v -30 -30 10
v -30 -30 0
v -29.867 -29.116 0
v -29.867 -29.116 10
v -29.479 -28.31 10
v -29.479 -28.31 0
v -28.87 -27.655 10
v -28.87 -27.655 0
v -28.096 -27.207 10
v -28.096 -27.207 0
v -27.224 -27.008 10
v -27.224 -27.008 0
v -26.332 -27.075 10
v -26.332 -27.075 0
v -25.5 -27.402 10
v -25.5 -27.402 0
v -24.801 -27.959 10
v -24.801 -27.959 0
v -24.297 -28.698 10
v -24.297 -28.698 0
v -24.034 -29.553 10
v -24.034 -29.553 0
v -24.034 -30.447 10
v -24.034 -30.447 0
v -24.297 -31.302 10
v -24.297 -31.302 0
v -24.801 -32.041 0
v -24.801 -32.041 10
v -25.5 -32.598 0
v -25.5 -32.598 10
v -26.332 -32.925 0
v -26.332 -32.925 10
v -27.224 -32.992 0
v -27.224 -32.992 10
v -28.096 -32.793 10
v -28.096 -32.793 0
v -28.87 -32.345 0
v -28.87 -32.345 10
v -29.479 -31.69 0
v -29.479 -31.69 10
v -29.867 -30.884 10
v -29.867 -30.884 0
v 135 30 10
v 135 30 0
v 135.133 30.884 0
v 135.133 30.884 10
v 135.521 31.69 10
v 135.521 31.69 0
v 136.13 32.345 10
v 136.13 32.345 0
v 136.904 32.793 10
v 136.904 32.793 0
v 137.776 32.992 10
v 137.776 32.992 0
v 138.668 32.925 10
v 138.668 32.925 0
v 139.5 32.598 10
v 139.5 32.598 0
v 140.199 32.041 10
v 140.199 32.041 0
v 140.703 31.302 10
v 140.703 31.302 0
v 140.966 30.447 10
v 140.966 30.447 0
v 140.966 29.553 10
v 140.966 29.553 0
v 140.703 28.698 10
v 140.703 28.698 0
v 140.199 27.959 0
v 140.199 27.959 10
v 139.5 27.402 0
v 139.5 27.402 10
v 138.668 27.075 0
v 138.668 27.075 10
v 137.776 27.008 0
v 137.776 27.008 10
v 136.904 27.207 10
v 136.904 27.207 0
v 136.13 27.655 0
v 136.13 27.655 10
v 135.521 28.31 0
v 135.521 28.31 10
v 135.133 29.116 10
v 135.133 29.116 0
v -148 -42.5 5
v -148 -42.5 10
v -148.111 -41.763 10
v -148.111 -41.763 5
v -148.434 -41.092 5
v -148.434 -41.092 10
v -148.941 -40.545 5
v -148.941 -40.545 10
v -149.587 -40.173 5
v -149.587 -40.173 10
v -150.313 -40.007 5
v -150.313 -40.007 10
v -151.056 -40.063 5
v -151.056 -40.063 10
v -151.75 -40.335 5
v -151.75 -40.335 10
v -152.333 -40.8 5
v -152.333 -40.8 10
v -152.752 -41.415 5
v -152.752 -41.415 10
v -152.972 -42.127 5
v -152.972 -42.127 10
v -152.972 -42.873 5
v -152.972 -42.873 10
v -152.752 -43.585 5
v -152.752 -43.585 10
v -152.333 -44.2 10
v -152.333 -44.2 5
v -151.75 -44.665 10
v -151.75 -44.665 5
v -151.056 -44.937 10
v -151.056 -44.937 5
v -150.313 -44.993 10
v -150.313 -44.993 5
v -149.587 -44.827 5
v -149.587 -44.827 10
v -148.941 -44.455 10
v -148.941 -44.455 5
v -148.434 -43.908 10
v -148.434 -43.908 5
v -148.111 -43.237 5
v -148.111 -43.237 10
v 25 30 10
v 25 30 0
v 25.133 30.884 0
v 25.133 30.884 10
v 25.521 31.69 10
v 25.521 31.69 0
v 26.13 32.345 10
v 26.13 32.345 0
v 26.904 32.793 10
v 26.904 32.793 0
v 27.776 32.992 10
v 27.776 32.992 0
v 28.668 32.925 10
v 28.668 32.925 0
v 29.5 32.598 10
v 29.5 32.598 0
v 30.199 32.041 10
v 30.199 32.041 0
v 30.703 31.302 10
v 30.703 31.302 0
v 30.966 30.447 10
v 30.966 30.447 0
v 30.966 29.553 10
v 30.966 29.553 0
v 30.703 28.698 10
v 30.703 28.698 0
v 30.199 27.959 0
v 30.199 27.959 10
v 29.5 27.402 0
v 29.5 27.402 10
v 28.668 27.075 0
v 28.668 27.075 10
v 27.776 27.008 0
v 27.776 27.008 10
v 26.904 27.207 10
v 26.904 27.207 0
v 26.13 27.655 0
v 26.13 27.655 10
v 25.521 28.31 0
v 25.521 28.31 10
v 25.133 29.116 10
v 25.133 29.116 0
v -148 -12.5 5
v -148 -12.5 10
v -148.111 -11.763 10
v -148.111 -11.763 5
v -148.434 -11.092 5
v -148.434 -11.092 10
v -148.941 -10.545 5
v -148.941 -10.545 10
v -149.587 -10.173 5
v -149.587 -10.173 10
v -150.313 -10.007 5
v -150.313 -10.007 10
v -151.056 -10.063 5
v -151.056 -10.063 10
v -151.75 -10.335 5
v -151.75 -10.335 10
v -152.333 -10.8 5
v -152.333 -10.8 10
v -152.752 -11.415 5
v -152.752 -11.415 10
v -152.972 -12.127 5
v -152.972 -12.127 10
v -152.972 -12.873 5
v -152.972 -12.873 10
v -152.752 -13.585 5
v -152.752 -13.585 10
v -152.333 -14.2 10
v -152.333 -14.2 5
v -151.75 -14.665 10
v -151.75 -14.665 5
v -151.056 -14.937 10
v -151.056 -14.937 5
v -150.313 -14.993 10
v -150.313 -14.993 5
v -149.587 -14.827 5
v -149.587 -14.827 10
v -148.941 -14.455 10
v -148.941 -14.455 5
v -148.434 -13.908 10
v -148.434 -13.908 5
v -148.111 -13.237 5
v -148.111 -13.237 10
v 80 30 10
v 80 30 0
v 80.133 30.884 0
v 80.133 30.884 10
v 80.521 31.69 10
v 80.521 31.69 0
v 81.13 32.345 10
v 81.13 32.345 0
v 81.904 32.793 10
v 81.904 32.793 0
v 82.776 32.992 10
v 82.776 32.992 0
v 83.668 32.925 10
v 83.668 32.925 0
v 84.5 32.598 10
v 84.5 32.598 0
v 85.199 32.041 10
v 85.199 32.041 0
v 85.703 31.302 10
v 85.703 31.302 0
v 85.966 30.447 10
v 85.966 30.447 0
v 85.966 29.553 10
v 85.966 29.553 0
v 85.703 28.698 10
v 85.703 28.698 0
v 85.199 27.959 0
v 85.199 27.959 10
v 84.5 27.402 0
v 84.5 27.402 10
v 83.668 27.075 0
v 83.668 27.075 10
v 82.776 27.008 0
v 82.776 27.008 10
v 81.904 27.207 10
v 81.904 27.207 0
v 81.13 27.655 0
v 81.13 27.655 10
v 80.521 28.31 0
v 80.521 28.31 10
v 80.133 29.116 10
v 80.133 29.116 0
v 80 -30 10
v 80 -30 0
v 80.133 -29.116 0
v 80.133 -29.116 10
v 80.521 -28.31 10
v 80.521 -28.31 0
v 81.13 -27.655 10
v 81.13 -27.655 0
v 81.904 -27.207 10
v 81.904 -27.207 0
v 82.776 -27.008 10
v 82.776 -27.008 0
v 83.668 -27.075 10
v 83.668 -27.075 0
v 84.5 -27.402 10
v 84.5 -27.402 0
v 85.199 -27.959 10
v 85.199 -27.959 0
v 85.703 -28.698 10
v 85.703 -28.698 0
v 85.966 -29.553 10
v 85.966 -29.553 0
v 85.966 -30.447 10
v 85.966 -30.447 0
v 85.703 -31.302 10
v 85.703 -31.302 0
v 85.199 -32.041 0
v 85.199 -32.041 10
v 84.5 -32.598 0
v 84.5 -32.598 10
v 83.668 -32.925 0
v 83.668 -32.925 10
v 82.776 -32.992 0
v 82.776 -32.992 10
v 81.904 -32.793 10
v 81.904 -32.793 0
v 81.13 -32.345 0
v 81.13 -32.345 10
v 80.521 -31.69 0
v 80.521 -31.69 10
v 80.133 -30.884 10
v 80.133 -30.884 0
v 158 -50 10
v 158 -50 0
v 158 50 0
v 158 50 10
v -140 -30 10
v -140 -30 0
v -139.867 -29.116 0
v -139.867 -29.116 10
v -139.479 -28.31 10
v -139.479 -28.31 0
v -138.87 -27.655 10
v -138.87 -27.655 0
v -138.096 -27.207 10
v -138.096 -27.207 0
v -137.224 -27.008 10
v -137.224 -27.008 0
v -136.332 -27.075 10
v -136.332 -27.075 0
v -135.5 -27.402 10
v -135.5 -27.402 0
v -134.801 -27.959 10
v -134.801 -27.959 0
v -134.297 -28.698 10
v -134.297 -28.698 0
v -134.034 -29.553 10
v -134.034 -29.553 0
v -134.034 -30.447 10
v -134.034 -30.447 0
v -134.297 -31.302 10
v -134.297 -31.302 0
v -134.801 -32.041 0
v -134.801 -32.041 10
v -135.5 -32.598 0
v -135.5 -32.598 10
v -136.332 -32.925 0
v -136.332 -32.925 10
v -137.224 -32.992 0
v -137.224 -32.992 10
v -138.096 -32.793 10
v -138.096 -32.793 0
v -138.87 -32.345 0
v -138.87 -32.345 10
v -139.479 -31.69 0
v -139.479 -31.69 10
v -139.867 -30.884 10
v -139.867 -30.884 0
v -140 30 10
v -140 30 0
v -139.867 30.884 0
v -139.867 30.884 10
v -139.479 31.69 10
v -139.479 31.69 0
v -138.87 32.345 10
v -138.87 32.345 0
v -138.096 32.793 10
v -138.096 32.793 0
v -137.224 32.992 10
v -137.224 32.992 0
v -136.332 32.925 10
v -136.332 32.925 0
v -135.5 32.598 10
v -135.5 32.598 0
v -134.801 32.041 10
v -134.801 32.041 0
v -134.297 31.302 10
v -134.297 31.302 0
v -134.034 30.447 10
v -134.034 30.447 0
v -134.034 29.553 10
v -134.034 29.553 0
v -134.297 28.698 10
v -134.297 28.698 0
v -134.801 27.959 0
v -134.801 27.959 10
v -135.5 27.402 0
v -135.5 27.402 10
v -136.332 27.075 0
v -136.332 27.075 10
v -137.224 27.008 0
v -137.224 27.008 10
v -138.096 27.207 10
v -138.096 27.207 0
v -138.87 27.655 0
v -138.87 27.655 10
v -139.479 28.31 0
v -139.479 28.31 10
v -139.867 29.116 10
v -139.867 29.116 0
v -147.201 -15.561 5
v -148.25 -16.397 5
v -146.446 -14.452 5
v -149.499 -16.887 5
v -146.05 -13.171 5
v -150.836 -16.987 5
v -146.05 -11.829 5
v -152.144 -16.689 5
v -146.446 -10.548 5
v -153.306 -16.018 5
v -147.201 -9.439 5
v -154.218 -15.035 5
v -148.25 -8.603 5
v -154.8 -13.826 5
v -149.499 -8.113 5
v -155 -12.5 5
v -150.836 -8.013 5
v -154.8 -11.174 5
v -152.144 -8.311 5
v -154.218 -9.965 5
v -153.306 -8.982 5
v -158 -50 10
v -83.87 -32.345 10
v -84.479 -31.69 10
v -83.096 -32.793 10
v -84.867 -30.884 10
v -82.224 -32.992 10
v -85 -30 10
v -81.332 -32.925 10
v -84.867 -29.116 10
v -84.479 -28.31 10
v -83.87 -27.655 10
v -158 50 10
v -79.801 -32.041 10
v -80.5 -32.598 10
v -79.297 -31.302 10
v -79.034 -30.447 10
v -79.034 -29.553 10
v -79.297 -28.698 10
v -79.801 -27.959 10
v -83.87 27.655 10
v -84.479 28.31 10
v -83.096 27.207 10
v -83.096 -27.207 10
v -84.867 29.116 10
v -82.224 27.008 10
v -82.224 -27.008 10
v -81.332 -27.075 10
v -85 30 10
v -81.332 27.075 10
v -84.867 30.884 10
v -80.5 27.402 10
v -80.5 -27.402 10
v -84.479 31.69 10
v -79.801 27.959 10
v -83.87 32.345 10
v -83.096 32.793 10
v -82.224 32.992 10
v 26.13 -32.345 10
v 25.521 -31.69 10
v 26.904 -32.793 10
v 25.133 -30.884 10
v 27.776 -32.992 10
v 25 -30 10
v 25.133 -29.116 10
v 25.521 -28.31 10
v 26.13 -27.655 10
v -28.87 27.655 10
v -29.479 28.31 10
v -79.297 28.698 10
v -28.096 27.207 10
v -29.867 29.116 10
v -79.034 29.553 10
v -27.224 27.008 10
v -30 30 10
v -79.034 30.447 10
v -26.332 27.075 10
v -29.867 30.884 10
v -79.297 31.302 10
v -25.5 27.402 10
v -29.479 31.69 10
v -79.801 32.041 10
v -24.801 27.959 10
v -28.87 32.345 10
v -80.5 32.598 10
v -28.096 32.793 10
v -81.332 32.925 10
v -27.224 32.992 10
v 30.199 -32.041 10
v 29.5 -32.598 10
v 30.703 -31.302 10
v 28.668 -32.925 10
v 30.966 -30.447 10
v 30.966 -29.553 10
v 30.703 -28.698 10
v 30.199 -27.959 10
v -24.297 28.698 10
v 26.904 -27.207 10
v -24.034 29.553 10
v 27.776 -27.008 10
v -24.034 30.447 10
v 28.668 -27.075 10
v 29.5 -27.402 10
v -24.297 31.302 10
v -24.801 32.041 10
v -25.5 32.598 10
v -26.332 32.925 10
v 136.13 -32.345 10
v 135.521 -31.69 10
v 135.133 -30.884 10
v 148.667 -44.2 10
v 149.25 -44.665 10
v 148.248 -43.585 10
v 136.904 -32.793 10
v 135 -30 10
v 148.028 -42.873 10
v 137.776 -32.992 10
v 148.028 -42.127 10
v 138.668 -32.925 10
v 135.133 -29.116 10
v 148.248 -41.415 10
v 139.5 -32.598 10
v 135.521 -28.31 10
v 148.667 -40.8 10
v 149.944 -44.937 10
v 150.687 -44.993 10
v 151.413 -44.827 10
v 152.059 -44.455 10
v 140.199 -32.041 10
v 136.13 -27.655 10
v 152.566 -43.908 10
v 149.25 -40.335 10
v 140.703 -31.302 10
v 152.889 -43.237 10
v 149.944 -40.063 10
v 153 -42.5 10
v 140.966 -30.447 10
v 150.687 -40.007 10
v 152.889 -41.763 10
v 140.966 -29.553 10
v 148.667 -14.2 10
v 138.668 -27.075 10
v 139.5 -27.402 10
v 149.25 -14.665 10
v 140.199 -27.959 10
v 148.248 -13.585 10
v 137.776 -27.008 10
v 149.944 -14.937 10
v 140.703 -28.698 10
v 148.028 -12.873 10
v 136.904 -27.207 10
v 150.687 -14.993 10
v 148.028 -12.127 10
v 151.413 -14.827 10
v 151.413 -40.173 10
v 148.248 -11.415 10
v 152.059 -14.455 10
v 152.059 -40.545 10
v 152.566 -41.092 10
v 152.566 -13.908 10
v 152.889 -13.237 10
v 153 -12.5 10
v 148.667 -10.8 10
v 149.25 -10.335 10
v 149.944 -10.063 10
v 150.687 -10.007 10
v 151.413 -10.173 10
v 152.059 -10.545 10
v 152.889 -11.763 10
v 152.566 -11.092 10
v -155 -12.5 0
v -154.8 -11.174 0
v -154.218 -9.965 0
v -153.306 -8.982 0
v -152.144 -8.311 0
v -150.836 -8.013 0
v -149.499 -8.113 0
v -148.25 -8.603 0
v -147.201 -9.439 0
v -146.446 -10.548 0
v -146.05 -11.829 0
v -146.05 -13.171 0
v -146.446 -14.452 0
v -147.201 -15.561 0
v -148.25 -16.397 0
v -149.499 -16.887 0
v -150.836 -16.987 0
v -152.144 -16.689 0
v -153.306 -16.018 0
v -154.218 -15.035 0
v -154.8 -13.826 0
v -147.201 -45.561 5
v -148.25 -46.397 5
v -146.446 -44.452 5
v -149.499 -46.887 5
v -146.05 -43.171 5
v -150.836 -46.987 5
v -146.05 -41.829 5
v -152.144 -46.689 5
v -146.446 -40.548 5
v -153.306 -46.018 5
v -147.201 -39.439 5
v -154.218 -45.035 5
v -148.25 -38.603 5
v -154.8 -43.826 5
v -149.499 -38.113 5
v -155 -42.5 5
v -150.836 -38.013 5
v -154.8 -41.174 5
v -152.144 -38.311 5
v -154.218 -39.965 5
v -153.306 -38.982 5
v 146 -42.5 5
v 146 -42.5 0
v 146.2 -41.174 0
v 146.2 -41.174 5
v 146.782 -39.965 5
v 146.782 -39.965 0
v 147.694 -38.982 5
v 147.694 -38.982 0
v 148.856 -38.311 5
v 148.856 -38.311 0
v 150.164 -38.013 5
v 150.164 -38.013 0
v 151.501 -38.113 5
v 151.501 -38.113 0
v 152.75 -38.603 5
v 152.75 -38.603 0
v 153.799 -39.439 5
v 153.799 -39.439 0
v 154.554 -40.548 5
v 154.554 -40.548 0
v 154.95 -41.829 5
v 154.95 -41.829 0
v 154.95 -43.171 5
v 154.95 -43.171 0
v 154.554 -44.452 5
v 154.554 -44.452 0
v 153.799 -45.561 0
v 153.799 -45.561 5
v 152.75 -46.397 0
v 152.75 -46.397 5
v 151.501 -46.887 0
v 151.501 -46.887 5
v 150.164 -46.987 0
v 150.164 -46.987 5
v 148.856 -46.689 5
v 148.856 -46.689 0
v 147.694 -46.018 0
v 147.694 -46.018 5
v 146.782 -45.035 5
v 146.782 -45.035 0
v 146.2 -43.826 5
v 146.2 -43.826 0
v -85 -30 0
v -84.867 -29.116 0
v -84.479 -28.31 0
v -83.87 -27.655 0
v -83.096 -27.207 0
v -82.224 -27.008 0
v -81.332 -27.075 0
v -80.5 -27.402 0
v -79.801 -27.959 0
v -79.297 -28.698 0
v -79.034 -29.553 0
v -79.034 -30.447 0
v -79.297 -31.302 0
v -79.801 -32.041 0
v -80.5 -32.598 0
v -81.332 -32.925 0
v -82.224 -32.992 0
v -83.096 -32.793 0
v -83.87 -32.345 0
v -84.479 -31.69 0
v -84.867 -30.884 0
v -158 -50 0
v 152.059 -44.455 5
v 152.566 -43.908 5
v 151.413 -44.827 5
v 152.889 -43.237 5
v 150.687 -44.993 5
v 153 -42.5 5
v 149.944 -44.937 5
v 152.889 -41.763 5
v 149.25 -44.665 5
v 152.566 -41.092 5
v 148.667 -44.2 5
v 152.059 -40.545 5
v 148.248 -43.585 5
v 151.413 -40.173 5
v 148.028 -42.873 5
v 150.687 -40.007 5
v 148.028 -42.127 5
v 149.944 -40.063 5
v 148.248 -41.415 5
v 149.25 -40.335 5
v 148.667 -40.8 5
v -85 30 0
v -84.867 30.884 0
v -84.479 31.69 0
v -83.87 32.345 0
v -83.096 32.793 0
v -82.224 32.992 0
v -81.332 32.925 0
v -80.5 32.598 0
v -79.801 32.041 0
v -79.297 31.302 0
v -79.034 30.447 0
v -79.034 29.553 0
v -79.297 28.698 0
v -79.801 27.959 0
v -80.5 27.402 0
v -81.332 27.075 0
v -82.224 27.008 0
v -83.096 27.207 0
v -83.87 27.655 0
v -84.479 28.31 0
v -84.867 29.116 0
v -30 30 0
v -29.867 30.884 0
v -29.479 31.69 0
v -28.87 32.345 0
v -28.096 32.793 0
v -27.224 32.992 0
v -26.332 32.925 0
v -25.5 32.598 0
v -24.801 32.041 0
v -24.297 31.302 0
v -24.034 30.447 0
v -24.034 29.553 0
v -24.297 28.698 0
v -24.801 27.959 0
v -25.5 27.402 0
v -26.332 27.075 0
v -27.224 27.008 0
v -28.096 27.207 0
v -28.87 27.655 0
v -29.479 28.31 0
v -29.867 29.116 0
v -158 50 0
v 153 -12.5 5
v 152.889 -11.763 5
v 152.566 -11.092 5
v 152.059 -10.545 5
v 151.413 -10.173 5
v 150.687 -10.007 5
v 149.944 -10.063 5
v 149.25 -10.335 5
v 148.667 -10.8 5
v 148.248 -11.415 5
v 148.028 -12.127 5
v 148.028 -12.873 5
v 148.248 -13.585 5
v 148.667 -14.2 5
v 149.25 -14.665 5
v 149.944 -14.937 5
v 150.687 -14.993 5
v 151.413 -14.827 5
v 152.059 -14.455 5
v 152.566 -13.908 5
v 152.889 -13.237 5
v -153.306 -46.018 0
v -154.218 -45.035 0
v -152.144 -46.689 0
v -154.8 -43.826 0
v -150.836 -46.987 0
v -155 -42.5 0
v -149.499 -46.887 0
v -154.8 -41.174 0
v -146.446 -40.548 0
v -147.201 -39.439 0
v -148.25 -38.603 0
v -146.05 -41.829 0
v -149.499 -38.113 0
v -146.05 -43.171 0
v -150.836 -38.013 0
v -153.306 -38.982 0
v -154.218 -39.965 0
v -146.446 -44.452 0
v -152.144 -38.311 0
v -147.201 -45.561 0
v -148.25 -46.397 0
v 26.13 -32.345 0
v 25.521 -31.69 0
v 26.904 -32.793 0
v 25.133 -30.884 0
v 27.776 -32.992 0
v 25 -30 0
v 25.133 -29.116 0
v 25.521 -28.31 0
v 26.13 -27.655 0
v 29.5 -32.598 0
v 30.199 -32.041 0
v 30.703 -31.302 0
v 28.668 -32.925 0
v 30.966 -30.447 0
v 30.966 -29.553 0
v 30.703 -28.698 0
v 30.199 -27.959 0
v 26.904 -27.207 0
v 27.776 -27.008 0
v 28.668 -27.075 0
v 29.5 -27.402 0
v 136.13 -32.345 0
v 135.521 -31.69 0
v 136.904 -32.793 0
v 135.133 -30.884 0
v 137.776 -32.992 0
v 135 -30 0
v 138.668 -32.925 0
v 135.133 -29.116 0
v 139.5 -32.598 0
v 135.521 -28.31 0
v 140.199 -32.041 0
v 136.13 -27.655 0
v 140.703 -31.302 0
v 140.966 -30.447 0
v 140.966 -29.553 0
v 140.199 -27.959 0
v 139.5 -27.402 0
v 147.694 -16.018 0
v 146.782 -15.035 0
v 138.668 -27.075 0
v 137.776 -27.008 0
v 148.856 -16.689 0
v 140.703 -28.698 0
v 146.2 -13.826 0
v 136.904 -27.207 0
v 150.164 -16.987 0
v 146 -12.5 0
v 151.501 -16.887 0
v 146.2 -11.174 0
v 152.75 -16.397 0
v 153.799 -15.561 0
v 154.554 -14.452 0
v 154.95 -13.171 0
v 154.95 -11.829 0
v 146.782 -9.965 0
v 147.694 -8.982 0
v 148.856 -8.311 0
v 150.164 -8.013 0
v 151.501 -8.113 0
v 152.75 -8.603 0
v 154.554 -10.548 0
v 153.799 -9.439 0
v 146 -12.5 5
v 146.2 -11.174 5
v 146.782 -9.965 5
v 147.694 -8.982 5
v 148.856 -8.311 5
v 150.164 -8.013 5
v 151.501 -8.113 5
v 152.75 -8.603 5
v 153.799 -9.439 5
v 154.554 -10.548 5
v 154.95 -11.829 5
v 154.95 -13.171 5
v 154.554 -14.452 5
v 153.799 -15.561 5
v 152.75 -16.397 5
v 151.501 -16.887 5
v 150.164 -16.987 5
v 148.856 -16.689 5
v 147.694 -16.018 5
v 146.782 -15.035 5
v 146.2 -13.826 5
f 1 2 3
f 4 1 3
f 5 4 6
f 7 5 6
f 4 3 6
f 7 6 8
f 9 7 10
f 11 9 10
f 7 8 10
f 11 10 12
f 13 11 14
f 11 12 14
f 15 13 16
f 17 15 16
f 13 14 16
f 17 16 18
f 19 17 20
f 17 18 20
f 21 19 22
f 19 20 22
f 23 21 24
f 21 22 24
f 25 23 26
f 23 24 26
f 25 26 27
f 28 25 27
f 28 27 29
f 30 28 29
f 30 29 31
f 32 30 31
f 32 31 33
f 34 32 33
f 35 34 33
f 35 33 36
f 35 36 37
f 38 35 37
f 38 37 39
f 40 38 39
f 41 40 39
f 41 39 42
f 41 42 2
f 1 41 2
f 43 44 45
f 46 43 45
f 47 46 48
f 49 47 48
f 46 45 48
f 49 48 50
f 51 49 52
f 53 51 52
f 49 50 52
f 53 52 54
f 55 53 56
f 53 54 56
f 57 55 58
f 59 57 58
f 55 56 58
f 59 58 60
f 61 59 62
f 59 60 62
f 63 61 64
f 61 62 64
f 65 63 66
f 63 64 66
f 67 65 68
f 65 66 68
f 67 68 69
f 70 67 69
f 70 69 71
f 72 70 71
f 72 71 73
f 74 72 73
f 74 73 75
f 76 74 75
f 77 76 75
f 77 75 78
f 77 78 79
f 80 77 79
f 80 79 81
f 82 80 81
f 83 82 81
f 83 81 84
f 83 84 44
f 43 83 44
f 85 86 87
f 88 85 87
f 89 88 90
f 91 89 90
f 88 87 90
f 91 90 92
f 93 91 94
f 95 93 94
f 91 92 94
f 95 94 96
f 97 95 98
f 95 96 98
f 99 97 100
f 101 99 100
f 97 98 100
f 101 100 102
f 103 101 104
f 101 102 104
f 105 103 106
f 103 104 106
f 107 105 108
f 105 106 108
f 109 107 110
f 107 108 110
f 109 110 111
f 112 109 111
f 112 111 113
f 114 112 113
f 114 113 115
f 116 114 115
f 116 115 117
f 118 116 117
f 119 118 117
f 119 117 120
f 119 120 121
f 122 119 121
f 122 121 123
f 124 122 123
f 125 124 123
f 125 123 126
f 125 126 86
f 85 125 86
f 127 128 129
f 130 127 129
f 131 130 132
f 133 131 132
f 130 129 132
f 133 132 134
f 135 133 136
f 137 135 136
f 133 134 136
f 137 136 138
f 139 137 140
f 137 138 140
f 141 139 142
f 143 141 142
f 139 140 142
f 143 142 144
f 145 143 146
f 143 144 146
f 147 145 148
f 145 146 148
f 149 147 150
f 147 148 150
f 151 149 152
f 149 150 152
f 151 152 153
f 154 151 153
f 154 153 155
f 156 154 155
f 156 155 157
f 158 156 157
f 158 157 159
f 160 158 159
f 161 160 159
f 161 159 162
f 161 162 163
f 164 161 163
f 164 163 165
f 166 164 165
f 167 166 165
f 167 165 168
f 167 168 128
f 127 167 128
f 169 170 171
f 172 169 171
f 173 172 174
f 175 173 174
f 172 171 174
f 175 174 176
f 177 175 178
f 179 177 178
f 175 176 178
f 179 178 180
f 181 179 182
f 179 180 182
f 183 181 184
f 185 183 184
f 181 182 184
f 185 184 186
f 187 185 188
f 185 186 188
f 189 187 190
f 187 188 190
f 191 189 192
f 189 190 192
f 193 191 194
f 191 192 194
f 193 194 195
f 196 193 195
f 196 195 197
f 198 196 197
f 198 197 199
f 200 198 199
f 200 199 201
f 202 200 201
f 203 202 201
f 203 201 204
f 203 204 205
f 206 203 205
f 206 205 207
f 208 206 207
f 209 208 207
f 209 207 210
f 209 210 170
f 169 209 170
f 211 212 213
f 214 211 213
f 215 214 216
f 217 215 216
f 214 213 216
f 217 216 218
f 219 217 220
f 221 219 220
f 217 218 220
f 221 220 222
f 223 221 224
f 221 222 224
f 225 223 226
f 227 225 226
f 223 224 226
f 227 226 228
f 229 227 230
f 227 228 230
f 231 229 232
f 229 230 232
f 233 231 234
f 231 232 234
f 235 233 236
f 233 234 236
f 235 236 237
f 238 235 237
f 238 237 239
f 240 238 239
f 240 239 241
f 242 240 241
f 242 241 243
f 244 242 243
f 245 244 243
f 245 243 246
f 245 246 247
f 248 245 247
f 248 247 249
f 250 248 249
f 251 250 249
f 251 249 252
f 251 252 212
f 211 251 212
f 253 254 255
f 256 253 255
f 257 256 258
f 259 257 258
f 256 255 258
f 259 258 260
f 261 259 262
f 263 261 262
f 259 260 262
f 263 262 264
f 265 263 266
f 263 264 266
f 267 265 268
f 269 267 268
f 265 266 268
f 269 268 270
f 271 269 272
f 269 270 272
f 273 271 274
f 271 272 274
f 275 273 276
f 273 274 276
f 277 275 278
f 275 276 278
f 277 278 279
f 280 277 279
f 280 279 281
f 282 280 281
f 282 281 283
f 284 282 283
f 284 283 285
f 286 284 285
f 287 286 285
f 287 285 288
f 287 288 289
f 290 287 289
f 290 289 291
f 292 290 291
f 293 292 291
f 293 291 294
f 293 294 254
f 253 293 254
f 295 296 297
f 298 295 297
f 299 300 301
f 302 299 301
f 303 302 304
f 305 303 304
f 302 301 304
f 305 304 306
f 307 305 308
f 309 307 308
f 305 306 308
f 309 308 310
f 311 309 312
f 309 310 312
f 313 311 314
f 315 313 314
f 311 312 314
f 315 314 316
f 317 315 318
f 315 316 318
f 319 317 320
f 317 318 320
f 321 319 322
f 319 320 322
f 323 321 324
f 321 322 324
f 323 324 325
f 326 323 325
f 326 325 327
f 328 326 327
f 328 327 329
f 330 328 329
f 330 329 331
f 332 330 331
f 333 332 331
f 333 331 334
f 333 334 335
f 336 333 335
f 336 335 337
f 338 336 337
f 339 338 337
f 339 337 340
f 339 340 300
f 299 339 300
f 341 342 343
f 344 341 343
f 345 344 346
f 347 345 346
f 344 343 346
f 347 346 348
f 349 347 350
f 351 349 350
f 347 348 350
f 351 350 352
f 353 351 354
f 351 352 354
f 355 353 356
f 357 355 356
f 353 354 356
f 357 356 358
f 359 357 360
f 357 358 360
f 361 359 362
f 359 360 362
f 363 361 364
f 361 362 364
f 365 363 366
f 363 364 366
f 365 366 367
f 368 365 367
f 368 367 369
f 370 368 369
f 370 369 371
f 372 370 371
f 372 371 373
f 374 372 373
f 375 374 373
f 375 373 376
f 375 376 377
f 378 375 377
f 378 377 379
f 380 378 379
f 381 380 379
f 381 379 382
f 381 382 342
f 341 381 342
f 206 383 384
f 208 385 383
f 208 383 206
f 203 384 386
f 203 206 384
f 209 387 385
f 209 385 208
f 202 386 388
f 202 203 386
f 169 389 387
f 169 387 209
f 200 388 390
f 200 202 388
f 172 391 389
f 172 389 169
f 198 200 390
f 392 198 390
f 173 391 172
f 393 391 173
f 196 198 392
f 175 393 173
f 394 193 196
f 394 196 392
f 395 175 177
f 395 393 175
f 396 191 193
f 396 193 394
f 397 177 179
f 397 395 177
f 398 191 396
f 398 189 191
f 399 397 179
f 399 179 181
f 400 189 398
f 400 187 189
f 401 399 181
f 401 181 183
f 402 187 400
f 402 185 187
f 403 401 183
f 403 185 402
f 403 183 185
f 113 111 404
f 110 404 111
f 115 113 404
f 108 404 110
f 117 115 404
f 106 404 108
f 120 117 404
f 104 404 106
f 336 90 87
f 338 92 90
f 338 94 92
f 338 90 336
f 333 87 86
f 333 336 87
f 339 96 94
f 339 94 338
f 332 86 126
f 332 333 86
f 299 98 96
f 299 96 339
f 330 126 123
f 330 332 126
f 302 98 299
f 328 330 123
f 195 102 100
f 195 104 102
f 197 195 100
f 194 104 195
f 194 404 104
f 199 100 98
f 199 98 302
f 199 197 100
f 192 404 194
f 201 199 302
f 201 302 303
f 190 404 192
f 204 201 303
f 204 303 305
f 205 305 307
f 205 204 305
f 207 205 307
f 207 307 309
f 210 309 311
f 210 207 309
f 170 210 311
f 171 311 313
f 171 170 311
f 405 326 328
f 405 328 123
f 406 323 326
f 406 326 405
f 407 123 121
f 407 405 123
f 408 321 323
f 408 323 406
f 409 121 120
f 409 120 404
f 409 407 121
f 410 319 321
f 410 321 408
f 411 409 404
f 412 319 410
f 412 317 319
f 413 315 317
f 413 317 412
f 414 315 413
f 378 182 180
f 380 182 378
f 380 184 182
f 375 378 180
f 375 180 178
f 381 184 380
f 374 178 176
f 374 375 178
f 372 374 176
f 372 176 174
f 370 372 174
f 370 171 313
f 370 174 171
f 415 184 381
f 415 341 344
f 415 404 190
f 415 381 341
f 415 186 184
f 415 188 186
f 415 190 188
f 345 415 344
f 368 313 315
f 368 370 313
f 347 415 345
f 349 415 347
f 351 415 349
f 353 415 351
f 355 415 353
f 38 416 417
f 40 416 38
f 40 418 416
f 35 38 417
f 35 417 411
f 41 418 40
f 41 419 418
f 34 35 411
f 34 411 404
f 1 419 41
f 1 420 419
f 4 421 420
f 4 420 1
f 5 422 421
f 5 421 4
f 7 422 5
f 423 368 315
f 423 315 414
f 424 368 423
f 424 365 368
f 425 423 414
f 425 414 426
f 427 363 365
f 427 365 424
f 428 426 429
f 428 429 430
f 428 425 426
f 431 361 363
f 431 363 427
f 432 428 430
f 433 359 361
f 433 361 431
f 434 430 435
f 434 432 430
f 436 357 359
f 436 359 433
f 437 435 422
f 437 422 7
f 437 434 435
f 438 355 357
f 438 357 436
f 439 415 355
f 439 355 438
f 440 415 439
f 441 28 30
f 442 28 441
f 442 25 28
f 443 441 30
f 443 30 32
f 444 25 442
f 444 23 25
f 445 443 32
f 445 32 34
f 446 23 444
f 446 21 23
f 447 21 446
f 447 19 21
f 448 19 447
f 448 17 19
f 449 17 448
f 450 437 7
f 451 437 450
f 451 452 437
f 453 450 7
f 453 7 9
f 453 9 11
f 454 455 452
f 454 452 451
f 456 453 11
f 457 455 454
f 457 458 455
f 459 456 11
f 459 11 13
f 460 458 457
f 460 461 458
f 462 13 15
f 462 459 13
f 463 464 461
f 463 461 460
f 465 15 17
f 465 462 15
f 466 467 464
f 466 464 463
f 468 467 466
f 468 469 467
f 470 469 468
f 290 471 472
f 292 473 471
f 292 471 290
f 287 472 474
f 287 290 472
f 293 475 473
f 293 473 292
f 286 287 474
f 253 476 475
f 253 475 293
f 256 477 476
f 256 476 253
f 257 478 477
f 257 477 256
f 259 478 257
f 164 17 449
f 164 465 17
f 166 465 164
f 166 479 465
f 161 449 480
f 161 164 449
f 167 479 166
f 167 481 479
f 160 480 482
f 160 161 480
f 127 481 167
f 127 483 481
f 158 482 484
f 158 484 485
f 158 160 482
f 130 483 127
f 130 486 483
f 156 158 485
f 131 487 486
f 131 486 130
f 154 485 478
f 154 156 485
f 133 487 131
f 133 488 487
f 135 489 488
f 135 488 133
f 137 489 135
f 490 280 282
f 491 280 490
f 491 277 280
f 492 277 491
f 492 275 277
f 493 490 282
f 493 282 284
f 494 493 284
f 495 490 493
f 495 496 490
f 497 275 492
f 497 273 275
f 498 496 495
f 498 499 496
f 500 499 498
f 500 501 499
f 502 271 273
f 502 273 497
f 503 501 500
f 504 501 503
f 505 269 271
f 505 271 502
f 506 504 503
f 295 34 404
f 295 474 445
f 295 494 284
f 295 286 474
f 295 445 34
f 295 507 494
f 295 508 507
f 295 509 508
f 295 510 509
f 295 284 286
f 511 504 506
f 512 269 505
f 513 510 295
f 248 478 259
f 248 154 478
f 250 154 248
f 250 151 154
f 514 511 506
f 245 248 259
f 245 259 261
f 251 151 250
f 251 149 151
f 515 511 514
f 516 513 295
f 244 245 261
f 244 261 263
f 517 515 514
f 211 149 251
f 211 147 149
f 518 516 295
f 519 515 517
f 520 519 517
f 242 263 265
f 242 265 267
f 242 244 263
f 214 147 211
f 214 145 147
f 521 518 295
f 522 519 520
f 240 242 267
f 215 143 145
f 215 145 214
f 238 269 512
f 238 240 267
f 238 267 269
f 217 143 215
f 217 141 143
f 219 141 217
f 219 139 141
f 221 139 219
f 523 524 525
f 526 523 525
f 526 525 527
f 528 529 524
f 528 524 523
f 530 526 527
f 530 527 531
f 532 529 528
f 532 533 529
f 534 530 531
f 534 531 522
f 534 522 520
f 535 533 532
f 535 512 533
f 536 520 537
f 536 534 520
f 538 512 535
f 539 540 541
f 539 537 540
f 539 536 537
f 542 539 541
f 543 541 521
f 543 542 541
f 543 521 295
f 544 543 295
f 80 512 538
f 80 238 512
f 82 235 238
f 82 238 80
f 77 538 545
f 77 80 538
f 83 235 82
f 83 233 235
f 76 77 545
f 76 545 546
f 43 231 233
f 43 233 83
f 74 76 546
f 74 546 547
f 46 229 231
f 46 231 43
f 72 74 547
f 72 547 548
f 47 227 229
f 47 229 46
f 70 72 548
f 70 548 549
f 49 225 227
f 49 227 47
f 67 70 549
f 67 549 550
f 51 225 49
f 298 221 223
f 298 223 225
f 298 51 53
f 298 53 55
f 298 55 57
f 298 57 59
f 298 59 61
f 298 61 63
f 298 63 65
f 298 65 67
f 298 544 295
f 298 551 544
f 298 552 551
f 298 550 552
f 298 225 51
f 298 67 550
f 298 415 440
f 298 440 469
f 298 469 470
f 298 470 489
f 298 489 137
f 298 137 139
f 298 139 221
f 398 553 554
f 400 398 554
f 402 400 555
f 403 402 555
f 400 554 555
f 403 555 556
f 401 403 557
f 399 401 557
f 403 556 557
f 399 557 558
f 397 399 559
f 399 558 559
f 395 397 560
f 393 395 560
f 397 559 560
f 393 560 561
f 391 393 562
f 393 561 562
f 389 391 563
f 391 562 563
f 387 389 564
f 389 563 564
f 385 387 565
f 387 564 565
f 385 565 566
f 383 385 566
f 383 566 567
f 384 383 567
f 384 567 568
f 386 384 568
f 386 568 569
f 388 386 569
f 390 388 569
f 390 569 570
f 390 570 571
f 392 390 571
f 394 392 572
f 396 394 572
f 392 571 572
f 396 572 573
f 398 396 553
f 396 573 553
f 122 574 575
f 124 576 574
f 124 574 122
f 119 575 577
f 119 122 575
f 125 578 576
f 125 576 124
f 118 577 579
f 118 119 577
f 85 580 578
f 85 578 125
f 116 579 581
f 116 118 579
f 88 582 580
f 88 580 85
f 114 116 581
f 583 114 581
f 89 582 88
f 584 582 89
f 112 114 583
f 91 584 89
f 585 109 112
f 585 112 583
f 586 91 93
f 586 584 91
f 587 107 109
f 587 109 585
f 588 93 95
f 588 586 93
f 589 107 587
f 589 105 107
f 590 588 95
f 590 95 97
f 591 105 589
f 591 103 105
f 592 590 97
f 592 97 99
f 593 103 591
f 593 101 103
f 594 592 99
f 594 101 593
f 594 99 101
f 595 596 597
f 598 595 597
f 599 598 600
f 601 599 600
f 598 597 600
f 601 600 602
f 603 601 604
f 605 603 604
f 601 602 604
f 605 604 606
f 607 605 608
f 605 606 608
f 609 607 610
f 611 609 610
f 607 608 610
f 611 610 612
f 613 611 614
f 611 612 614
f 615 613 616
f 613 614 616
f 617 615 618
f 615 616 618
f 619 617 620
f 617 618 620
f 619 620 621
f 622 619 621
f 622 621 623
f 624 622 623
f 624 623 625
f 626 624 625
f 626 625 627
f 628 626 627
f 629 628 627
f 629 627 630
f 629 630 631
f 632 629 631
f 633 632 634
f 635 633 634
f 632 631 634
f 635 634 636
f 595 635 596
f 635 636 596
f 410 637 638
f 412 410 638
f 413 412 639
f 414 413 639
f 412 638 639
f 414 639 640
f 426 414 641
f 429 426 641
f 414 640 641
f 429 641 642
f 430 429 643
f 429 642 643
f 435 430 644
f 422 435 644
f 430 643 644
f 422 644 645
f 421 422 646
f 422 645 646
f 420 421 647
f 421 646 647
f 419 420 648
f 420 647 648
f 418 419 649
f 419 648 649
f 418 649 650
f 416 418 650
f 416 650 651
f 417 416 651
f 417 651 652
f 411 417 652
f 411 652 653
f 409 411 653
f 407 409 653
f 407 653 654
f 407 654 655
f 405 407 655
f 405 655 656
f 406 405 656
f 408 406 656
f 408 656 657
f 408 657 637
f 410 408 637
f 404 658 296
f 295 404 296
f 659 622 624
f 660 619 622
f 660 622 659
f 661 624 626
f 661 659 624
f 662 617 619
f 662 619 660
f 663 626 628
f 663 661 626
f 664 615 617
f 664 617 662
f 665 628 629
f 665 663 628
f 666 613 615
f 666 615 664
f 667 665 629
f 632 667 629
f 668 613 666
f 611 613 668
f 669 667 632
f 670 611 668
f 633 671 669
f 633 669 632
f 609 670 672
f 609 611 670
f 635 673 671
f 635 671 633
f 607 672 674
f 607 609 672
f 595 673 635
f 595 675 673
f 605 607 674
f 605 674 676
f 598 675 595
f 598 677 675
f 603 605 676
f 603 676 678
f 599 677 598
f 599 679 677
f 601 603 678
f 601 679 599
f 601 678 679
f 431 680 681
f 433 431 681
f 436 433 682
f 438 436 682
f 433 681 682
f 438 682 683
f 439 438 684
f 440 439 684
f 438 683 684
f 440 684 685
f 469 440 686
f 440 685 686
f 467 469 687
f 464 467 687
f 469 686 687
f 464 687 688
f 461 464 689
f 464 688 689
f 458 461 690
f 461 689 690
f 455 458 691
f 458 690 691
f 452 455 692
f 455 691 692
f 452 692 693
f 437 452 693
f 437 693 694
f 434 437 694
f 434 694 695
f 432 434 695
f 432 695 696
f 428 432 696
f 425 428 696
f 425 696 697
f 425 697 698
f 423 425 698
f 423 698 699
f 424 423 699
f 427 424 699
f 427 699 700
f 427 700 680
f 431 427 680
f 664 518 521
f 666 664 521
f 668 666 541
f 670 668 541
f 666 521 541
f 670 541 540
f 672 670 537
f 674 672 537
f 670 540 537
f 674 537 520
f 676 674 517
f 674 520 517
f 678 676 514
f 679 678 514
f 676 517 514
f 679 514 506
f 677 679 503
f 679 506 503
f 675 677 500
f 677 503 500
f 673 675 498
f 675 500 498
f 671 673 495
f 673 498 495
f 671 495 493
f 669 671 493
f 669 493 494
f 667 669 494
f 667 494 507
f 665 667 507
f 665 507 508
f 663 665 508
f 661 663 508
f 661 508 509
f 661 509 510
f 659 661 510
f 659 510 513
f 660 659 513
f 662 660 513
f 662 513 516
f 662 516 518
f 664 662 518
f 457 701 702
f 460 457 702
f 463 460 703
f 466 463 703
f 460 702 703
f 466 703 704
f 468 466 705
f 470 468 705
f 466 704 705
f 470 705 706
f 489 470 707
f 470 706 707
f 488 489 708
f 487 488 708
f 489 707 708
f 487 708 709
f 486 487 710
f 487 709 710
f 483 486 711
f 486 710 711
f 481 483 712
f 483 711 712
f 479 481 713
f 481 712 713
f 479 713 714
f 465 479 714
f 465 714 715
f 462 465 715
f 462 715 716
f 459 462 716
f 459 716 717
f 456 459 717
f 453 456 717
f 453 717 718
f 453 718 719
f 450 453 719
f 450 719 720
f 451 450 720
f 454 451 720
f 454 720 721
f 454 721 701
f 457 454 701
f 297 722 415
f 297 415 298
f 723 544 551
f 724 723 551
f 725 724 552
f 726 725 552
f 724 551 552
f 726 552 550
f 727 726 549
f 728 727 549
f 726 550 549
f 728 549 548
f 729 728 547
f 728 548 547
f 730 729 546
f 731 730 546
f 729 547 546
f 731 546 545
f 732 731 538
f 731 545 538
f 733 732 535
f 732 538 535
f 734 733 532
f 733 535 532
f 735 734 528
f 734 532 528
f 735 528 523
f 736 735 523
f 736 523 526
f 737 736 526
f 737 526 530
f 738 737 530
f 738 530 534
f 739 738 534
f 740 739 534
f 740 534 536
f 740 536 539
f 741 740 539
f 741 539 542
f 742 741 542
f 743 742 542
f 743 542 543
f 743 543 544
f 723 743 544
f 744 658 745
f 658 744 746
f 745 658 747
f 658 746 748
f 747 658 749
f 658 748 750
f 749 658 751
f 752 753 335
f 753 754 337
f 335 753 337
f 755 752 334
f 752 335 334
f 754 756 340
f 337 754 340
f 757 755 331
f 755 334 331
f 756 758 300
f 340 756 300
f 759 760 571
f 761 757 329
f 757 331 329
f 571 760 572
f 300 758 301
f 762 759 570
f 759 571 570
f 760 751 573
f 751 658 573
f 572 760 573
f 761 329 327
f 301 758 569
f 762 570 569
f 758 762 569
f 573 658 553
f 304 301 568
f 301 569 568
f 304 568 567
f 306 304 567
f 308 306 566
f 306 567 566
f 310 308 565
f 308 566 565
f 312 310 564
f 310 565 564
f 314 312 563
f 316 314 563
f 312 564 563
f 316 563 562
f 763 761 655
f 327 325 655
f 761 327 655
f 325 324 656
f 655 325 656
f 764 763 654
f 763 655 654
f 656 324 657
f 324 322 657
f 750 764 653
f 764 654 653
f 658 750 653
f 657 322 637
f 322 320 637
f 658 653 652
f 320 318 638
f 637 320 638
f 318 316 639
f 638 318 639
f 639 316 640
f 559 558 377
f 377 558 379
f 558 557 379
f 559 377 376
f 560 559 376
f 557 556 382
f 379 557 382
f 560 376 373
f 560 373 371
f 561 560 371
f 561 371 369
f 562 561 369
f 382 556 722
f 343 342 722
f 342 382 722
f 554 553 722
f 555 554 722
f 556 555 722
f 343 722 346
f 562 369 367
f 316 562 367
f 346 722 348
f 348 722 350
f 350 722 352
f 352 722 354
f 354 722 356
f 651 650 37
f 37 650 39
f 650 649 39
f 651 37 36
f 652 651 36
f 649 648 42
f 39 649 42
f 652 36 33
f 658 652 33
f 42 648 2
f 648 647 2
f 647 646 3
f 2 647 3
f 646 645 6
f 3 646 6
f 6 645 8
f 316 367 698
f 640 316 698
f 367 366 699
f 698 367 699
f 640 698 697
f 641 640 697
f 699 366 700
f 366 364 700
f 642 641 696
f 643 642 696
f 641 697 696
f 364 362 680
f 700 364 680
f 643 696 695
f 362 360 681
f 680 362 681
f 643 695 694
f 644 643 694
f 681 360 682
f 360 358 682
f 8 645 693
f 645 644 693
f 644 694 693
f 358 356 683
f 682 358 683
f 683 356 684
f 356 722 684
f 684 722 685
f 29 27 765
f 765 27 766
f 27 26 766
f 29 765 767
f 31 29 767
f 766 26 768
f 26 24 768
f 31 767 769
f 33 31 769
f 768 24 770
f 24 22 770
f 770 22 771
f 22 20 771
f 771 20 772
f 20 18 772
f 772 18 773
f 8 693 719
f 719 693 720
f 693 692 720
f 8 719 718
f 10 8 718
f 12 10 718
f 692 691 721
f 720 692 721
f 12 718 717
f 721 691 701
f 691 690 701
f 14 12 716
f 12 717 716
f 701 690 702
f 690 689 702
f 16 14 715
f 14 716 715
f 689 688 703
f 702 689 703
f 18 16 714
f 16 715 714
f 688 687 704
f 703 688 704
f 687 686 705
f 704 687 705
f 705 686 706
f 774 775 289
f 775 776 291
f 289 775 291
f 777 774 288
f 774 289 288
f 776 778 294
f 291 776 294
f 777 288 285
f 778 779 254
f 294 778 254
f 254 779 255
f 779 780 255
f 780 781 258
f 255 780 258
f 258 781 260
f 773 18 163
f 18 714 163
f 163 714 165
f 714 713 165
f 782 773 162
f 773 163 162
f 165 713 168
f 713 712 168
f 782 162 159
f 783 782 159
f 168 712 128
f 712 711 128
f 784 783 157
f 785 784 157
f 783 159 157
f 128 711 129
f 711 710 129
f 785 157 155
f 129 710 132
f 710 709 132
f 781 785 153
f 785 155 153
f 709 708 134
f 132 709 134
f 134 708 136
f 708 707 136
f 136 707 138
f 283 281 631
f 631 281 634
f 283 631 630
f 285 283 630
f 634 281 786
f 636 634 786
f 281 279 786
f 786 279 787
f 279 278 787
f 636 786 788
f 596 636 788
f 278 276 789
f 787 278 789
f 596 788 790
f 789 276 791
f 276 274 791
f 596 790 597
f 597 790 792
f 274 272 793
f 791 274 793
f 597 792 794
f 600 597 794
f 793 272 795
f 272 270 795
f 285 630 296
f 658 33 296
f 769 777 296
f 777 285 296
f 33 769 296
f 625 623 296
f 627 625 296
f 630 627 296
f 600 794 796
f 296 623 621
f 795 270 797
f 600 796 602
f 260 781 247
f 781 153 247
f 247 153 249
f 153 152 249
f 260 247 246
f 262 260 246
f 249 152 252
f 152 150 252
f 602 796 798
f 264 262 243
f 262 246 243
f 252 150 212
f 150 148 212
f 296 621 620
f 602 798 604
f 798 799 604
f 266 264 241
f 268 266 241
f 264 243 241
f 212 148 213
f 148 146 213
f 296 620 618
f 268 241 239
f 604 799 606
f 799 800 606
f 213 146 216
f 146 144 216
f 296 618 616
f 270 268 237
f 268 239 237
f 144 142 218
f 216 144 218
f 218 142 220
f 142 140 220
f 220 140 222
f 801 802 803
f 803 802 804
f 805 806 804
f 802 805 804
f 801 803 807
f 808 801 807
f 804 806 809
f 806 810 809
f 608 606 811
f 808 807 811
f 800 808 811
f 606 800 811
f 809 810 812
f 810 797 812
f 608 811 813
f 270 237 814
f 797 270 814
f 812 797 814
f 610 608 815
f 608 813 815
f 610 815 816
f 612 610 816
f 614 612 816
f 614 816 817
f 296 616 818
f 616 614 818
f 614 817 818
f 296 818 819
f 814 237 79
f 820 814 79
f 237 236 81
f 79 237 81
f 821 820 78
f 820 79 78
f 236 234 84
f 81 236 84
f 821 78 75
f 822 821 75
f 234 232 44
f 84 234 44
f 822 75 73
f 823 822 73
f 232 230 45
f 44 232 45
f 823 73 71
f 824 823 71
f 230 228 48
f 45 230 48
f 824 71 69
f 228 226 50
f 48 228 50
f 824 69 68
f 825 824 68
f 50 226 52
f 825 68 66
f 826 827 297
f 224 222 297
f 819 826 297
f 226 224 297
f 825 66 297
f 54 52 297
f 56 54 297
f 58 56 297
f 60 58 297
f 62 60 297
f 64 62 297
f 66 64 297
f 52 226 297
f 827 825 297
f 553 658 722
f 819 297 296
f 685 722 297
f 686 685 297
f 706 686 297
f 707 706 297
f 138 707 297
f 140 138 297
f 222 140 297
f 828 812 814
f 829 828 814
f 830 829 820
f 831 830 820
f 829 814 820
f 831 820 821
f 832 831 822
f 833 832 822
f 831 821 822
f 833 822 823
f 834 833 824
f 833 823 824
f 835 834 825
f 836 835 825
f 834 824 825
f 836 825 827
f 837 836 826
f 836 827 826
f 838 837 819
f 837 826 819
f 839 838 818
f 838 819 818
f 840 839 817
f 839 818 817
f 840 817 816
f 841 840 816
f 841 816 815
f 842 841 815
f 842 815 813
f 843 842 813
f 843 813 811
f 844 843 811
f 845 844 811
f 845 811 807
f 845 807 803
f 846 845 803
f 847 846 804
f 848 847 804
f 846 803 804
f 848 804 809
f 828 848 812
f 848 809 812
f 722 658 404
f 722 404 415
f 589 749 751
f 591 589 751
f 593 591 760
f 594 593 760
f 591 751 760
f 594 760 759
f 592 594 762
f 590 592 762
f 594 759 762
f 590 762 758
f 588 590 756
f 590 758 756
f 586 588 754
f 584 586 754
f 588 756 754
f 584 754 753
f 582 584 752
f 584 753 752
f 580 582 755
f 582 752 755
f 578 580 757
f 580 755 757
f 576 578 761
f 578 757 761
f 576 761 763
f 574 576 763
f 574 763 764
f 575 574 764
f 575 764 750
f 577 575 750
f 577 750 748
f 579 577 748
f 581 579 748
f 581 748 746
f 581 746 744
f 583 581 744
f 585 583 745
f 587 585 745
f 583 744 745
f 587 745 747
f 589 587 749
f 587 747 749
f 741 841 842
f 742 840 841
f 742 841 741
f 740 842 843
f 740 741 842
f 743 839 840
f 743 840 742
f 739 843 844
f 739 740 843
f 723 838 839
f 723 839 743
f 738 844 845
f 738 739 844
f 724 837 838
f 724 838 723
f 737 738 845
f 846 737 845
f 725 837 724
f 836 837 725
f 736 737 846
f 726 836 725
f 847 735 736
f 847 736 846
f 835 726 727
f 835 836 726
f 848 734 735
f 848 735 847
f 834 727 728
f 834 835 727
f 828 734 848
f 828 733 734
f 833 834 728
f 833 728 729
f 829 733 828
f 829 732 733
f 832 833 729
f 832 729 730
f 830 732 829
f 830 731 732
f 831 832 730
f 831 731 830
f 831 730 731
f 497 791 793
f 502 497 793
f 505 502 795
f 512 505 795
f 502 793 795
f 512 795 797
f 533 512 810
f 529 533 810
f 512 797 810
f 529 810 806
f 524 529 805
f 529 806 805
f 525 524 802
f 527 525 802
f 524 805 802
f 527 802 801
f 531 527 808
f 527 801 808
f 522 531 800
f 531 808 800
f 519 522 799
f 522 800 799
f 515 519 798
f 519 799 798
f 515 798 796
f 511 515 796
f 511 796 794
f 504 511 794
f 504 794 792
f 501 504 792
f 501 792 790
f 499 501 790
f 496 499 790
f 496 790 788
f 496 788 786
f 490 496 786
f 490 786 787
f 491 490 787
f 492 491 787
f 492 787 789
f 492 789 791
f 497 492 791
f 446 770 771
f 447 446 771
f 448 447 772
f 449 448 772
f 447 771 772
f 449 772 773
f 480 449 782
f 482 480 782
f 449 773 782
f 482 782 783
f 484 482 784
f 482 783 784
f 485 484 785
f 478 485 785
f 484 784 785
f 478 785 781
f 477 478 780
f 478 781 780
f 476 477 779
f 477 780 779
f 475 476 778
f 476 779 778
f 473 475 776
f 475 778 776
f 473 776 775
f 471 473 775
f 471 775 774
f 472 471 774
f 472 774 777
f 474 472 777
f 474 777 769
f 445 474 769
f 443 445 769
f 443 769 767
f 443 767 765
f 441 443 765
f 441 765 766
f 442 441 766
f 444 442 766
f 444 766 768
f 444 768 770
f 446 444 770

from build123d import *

# Parameters (mm, degrees)
SKETCH1_W           = 316
SKETCH1_H           = 100
BOSS_EXTRUDE1_DEPTH = 10
CUT_EXTRUDE1_REACH  = 168.024
SKETCH4_R           = 3
CUT_EXTRUDE2_REACH  = 168.024
SKETCH5_R           = 2.5
SKETCH6_R           = 4.5
CUT_EXTRUDE3_DEPTH  = 5


with BuildPart() as part:
    # Sketch1 → Boss-Extrude1 (new body)
    with BuildSketch(Plane.XY):
        Rectangle(SKETCH1_W, SKETCH1_H)
    extrude(amount=BOSS_EXTRUDE1_DEPTH)

    # Sketch4 → Cut-Extrude1 (cut, up to next)
    with BuildSketch(Plane(origin=(0, 0, 0), x_dir=(-1, 0, 0), z_dir=(0, 0, -1)), mode=Mode.PRIVATE) as cut_extrude1_sk1:
        with Locations((-138, 30)):
            Circle(SKETCH4_R)
    cut_extrude1_tool1 = extrude(cut_extrude1_sk1.sketch, amount=-CUT_EXTRUDE1_REACH, mode=Mode.PRIVATE) & part.part
    # Sketch4 → Cut-Extrude1 (cut, up to next)
    with BuildSketch(Plane(origin=(0, 0, 0), x_dir=(-1, 0, 0), z_dir=(0, 0, -1)), mode=Mode.PRIVATE) as cut_extrude1_sk2:
        with Locations((-83, 30)):
            Circle(SKETCH4_R)
    cut_extrude1_tool2 = extrude(cut_extrude1_sk2.sketch, amount=-CUT_EXTRUDE1_REACH, mode=Mode.PRIVATE) & part.part
    # Sketch4 → Cut-Extrude1 (cut, up to next)
    with BuildSketch(Plane(origin=(0, 0, 0), x_dir=(-1, 0, 0), z_dir=(0, 0, -1)), mode=Mode.PRIVATE) as cut_extrude1_sk3:
        with Locations((-28, 30)):
            Circle(SKETCH4_R)
    cut_extrude1_tool3 = extrude(cut_extrude1_sk3.sketch, amount=-CUT_EXTRUDE1_REACH, mode=Mode.PRIVATE) & part.part
    # Sketch4 → Cut-Extrude1 (cut, up to next)
    with BuildSketch(Plane(origin=(0, 0, 0), x_dir=(-1, 0, 0), z_dir=(0, 0, -1)), mode=Mode.PRIVATE) as cut_extrude1_sk4:
        with Locations((27, 30)):
            Circle(SKETCH4_R)
    cut_extrude1_tool4 = extrude(cut_extrude1_sk4.sketch, amount=-CUT_EXTRUDE1_REACH, mode=Mode.PRIVATE) & part.part
    # Sketch4 → Cut-Extrude1 (cut, up to next)
    with BuildSketch(Plane(origin=(0, 0, 0), x_dir=(-1, 0, 0), z_dir=(0, 0, -1)), mode=Mode.PRIVATE) as cut_extrude1_sk5:
        with Locations((82, 30)):
            Circle(SKETCH4_R)
    cut_extrude1_tool5 = extrude(cut_extrude1_sk5.sketch, amount=-CUT_EXTRUDE1_REACH, mode=Mode.PRIVATE) & part.part
    # Sketch4 → Cut-Extrude1 (cut, up to next)
    with BuildSketch(Plane(origin=(0, 0, 0), x_dir=(-1, 0, 0), z_dir=(0, 0, -1)), mode=Mode.PRIVATE) as cut_extrude1_sk6:
        with Locations((137, 30)):
            Circle(SKETCH4_R)
    cut_extrude1_tool6 = extrude(cut_extrude1_sk6.sketch, amount=-CUT_EXTRUDE1_REACH, mode=Mode.PRIVATE) & part.part
    # Sketch4 → Cut-Extrude1 (cut, up to next)
    with BuildSketch(Plane(origin=(0, 0, 0), x_dir=(-1, 0, 0), z_dir=(0, 0, -1)), mode=Mode.PRIVATE) as cut_extrude1_sk7:
        with Locations((137, -30)):
            Circle(SKETCH4_R)
    cut_extrude1_tool7 = extrude(cut_extrude1_sk7.sketch, amount=-CUT_EXTRUDE1_REACH, mode=Mode.PRIVATE) & part.part
    # Sketch4 → Cut-Extrude1 (cut, up to next)
    with BuildSketch(Plane(origin=(0, 0, 0), x_dir=(-1, 0, 0), z_dir=(0, 0, -1)), mode=Mode.PRIVATE) as cut_extrude1_sk8:
        with Locations((82, -30)):
            Circle(SKETCH4_R)
    cut_extrude1_tool8 = extrude(cut_extrude1_sk8.sketch, amount=-CUT_EXTRUDE1_REACH, mode=Mode.PRIVATE) & part.part
    # Sketch4 → Cut-Extrude1 (cut, up to next)
    with BuildSketch(Plane(origin=(0, 0, 0), x_dir=(-1, 0, 0), z_dir=(0, 0, -1)), mode=Mode.PRIVATE) as cut_extrude1_sk9:
        with Locations((27, -30)):
            Circle(SKETCH4_R)
    cut_extrude1_tool9 = extrude(cut_extrude1_sk9.sketch, amount=-CUT_EXTRUDE1_REACH, mode=Mode.PRIVATE) & part.part
    # Sketch4 → Cut-Extrude1 (cut, up to next)
    with BuildSketch(Plane(origin=(0, 0, 0), x_dir=(-1, 0, 0), z_dir=(0, 0, -1)), mode=Mode.PRIVATE) as cut_extrude1_sk10:
        with Locations((-28, -30)):
            Circle(SKETCH4_R)
    cut_extrude1_tool10 = extrude(cut_extrude1_sk10.sketch, amount=-CUT_EXTRUDE1_REACH, mode=Mode.PRIVATE) & part.part
    # Sketch4 → Cut-Extrude1 (cut, up to next)
    with BuildSketch(Plane(origin=(0, 0, 0), x_dir=(-1, 0, 0), z_dir=(0, 0, -1)), mode=Mode.PRIVATE) as cut_extrude1_sk11:
        with Locations((-83, -30)):
            Circle(SKETCH4_R)
    cut_extrude1_tool11 = extrude(cut_extrude1_sk11.sketch, amount=-CUT_EXTRUDE1_REACH, mode=Mode.PRIVATE) & part.part
    # Sketch4 → Cut-Extrude1 (cut, up to next)
    with BuildSketch(Plane(origin=(0, 0, 0), x_dir=(-1, 0, 0), z_dir=(0, 0, -1)), mode=Mode.PRIVATE) as cut_extrude1_sk12:
        with Locations((-138, -30)):
            Circle(SKETCH4_R)
    cut_extrude1_tool12 = extrude(cut_extrude1_sk12.sketch, amount=-CUT_EXTRUDE1_REACH, mode=Mode.PRIVATE) & part.part
    add(cut_extrude1_tool1.solids().sort_by_distance((138, 30, 0))[0], mode=Mode.SUBTRACT)
    add(cut_extrude1_tool2.solids().sort_by_distance((83, 30, 0))[0], mode=Mode.SUBTRACT)
    add(cut_extrude1_tool3.solids().sort_by_distance((28, 30, 0))[0], mode=Mode.SUBTRACT)
    add(cut_extrude1_tool4.solids().sort_by_distance((-27, 30, 0))[0], mode=Mode.SUBTRACT)
    add(cut_extrude1_tool5.solids().sort_by_distance((-82, 30, 0))[0], mode=Mode.SUBTRACT)
    add(cut_extrude1_tool6.solids().sort_by_distance((-137, 30, 0))[0], mode=Mode.SUBTRACT)
    add(cut_extrude1_tool7.solids().sort_by_distance((-137, -30, 0))[0], mode=Mode.SUBTRACT)
    add(cut_extrude1_tool8.solids().sort_by_distance((-82, -30, 0))[0], mode=Mode.SUBTRACT)
    add(cut_extrude1_tool9.solids().sort_by_distance((-27, -30, 0))[0], mode=Mode.SUBTRACT)
    add(cut_extrude1_tool10.solids().sort_by_distance((28, -30, 0))[0], mode=Mode.SUBTRACT)
    add(cut_extrude1_tool11.solids().sort_by_distance((83, -30, 0))[0], mode=Mode.SUBTRACT)
    add(cut_extrude1_tool12.solids().sort_by_distance((138, -30, 0))[0], mode=Mode.SUBTRACT)

    # Sketch5 → Cut-Extrude2 (cut, up to next)
    with BuildSketch(Plane.XY.offset(10), mode=Mode.PRIVATE) as cut_extrude2_sk1:
        with Locations((-150.5, -42.5)):
            Circle(SKETCH5_R)
    cut_extrude2_tool1 = extrude(cut_extrude2_sk1.sketch, amount=-CUT_EXTRUDE2_REACH, mode=Mode.PRIVATE) & part.part
    # Sketch5 → Cut-Extrude2 (cut, up to next)
    with BuildSketch(Plane.XY.offset(10), mode=Mode.PRIVATE) as cut_extrude2_sk2:
        with Locations((150.5, -42.5)):
            Circle(SKETCH5_R)
    cut_extrude2_tool2 = extrude(cut_extrude2_sk2.sketch, amount=-CUT_EXTRUDE2_REACH, mode=Mode.PRIVATE) & part.part
    # Sketch5 → Cut-Extrude2 (cut, up to next)
    with BuildSketch(Plane.XY.offset(10), mode=Mode.PRIVATE) as cut_extrude2_sk3:
        with Locations((-150.5, -12.5)):
            Circle(SKETCH5_R)
    cut_extrude2_tool3 = extrude(cut_extrude2_sk3.sketch, amount=-CUT_EXTRUDE2_REACH, mode=Mode.PRIVATE) & part.part
    # Sketch5 → Cut-Extrude2 (cut, up to next)
    with BuildSketch(Plane.XY.offset(10), mode=Mode.PRIVATE) as cut_extrude2_sk4:
        with Locations((150.5, -12.5)):
            Circle(SKETCH5_R)
    cut_extrude2_tool4 = extrude(cut_extrude2_sk4.sketch, amount=-CUT_EXTRUDE2_REACH, mode=Mode.PRIVATE) & part.part
    add(cut_extrude2_tool1.solids().sort_by_distance((-150.5, -42.5, 10))[0], mode=Mode.SUBTRACT)
    add(cut_extrude2_tool2.solids().sort_by_distance((150.5, -42.5, 10))[0], mode=Mode.SUBTRACT)
    add(cut_extrude2_tool3.solids().sort_by_distance((-150.5, -12.5, 10))[0], mode=Mode.SUBTRACT)
    add(cut_extrude2_tool4.solids().sort_by_distance((150.5, -12.5, 10))[0], mode=Mode.SUBTRACT)

    # Sketch6 → Cut-Extrude3 (cut)
    with BuildSketch(Plane(origin=(0, 0, 0), x_dir=(-1, 0, 0), z_dir=(0, 0, -1))):
        with Locations((-150.5, -42.5)):
            Circle(SKETCH6_R)
        with Locations((-150.5, -12.5)):
            Circle(SKETCH6_R)
        with Locations((150.5, -12.5)):
            Circle(SKETCH6_R)
        with Locations((150.5, -42.5)):
            Circle(SKETCH6_R)
    extrude(amount=-CUT_EXTRUDE3_DEPTH, mode=Mode.SUBTRACT)


solid = part.part
